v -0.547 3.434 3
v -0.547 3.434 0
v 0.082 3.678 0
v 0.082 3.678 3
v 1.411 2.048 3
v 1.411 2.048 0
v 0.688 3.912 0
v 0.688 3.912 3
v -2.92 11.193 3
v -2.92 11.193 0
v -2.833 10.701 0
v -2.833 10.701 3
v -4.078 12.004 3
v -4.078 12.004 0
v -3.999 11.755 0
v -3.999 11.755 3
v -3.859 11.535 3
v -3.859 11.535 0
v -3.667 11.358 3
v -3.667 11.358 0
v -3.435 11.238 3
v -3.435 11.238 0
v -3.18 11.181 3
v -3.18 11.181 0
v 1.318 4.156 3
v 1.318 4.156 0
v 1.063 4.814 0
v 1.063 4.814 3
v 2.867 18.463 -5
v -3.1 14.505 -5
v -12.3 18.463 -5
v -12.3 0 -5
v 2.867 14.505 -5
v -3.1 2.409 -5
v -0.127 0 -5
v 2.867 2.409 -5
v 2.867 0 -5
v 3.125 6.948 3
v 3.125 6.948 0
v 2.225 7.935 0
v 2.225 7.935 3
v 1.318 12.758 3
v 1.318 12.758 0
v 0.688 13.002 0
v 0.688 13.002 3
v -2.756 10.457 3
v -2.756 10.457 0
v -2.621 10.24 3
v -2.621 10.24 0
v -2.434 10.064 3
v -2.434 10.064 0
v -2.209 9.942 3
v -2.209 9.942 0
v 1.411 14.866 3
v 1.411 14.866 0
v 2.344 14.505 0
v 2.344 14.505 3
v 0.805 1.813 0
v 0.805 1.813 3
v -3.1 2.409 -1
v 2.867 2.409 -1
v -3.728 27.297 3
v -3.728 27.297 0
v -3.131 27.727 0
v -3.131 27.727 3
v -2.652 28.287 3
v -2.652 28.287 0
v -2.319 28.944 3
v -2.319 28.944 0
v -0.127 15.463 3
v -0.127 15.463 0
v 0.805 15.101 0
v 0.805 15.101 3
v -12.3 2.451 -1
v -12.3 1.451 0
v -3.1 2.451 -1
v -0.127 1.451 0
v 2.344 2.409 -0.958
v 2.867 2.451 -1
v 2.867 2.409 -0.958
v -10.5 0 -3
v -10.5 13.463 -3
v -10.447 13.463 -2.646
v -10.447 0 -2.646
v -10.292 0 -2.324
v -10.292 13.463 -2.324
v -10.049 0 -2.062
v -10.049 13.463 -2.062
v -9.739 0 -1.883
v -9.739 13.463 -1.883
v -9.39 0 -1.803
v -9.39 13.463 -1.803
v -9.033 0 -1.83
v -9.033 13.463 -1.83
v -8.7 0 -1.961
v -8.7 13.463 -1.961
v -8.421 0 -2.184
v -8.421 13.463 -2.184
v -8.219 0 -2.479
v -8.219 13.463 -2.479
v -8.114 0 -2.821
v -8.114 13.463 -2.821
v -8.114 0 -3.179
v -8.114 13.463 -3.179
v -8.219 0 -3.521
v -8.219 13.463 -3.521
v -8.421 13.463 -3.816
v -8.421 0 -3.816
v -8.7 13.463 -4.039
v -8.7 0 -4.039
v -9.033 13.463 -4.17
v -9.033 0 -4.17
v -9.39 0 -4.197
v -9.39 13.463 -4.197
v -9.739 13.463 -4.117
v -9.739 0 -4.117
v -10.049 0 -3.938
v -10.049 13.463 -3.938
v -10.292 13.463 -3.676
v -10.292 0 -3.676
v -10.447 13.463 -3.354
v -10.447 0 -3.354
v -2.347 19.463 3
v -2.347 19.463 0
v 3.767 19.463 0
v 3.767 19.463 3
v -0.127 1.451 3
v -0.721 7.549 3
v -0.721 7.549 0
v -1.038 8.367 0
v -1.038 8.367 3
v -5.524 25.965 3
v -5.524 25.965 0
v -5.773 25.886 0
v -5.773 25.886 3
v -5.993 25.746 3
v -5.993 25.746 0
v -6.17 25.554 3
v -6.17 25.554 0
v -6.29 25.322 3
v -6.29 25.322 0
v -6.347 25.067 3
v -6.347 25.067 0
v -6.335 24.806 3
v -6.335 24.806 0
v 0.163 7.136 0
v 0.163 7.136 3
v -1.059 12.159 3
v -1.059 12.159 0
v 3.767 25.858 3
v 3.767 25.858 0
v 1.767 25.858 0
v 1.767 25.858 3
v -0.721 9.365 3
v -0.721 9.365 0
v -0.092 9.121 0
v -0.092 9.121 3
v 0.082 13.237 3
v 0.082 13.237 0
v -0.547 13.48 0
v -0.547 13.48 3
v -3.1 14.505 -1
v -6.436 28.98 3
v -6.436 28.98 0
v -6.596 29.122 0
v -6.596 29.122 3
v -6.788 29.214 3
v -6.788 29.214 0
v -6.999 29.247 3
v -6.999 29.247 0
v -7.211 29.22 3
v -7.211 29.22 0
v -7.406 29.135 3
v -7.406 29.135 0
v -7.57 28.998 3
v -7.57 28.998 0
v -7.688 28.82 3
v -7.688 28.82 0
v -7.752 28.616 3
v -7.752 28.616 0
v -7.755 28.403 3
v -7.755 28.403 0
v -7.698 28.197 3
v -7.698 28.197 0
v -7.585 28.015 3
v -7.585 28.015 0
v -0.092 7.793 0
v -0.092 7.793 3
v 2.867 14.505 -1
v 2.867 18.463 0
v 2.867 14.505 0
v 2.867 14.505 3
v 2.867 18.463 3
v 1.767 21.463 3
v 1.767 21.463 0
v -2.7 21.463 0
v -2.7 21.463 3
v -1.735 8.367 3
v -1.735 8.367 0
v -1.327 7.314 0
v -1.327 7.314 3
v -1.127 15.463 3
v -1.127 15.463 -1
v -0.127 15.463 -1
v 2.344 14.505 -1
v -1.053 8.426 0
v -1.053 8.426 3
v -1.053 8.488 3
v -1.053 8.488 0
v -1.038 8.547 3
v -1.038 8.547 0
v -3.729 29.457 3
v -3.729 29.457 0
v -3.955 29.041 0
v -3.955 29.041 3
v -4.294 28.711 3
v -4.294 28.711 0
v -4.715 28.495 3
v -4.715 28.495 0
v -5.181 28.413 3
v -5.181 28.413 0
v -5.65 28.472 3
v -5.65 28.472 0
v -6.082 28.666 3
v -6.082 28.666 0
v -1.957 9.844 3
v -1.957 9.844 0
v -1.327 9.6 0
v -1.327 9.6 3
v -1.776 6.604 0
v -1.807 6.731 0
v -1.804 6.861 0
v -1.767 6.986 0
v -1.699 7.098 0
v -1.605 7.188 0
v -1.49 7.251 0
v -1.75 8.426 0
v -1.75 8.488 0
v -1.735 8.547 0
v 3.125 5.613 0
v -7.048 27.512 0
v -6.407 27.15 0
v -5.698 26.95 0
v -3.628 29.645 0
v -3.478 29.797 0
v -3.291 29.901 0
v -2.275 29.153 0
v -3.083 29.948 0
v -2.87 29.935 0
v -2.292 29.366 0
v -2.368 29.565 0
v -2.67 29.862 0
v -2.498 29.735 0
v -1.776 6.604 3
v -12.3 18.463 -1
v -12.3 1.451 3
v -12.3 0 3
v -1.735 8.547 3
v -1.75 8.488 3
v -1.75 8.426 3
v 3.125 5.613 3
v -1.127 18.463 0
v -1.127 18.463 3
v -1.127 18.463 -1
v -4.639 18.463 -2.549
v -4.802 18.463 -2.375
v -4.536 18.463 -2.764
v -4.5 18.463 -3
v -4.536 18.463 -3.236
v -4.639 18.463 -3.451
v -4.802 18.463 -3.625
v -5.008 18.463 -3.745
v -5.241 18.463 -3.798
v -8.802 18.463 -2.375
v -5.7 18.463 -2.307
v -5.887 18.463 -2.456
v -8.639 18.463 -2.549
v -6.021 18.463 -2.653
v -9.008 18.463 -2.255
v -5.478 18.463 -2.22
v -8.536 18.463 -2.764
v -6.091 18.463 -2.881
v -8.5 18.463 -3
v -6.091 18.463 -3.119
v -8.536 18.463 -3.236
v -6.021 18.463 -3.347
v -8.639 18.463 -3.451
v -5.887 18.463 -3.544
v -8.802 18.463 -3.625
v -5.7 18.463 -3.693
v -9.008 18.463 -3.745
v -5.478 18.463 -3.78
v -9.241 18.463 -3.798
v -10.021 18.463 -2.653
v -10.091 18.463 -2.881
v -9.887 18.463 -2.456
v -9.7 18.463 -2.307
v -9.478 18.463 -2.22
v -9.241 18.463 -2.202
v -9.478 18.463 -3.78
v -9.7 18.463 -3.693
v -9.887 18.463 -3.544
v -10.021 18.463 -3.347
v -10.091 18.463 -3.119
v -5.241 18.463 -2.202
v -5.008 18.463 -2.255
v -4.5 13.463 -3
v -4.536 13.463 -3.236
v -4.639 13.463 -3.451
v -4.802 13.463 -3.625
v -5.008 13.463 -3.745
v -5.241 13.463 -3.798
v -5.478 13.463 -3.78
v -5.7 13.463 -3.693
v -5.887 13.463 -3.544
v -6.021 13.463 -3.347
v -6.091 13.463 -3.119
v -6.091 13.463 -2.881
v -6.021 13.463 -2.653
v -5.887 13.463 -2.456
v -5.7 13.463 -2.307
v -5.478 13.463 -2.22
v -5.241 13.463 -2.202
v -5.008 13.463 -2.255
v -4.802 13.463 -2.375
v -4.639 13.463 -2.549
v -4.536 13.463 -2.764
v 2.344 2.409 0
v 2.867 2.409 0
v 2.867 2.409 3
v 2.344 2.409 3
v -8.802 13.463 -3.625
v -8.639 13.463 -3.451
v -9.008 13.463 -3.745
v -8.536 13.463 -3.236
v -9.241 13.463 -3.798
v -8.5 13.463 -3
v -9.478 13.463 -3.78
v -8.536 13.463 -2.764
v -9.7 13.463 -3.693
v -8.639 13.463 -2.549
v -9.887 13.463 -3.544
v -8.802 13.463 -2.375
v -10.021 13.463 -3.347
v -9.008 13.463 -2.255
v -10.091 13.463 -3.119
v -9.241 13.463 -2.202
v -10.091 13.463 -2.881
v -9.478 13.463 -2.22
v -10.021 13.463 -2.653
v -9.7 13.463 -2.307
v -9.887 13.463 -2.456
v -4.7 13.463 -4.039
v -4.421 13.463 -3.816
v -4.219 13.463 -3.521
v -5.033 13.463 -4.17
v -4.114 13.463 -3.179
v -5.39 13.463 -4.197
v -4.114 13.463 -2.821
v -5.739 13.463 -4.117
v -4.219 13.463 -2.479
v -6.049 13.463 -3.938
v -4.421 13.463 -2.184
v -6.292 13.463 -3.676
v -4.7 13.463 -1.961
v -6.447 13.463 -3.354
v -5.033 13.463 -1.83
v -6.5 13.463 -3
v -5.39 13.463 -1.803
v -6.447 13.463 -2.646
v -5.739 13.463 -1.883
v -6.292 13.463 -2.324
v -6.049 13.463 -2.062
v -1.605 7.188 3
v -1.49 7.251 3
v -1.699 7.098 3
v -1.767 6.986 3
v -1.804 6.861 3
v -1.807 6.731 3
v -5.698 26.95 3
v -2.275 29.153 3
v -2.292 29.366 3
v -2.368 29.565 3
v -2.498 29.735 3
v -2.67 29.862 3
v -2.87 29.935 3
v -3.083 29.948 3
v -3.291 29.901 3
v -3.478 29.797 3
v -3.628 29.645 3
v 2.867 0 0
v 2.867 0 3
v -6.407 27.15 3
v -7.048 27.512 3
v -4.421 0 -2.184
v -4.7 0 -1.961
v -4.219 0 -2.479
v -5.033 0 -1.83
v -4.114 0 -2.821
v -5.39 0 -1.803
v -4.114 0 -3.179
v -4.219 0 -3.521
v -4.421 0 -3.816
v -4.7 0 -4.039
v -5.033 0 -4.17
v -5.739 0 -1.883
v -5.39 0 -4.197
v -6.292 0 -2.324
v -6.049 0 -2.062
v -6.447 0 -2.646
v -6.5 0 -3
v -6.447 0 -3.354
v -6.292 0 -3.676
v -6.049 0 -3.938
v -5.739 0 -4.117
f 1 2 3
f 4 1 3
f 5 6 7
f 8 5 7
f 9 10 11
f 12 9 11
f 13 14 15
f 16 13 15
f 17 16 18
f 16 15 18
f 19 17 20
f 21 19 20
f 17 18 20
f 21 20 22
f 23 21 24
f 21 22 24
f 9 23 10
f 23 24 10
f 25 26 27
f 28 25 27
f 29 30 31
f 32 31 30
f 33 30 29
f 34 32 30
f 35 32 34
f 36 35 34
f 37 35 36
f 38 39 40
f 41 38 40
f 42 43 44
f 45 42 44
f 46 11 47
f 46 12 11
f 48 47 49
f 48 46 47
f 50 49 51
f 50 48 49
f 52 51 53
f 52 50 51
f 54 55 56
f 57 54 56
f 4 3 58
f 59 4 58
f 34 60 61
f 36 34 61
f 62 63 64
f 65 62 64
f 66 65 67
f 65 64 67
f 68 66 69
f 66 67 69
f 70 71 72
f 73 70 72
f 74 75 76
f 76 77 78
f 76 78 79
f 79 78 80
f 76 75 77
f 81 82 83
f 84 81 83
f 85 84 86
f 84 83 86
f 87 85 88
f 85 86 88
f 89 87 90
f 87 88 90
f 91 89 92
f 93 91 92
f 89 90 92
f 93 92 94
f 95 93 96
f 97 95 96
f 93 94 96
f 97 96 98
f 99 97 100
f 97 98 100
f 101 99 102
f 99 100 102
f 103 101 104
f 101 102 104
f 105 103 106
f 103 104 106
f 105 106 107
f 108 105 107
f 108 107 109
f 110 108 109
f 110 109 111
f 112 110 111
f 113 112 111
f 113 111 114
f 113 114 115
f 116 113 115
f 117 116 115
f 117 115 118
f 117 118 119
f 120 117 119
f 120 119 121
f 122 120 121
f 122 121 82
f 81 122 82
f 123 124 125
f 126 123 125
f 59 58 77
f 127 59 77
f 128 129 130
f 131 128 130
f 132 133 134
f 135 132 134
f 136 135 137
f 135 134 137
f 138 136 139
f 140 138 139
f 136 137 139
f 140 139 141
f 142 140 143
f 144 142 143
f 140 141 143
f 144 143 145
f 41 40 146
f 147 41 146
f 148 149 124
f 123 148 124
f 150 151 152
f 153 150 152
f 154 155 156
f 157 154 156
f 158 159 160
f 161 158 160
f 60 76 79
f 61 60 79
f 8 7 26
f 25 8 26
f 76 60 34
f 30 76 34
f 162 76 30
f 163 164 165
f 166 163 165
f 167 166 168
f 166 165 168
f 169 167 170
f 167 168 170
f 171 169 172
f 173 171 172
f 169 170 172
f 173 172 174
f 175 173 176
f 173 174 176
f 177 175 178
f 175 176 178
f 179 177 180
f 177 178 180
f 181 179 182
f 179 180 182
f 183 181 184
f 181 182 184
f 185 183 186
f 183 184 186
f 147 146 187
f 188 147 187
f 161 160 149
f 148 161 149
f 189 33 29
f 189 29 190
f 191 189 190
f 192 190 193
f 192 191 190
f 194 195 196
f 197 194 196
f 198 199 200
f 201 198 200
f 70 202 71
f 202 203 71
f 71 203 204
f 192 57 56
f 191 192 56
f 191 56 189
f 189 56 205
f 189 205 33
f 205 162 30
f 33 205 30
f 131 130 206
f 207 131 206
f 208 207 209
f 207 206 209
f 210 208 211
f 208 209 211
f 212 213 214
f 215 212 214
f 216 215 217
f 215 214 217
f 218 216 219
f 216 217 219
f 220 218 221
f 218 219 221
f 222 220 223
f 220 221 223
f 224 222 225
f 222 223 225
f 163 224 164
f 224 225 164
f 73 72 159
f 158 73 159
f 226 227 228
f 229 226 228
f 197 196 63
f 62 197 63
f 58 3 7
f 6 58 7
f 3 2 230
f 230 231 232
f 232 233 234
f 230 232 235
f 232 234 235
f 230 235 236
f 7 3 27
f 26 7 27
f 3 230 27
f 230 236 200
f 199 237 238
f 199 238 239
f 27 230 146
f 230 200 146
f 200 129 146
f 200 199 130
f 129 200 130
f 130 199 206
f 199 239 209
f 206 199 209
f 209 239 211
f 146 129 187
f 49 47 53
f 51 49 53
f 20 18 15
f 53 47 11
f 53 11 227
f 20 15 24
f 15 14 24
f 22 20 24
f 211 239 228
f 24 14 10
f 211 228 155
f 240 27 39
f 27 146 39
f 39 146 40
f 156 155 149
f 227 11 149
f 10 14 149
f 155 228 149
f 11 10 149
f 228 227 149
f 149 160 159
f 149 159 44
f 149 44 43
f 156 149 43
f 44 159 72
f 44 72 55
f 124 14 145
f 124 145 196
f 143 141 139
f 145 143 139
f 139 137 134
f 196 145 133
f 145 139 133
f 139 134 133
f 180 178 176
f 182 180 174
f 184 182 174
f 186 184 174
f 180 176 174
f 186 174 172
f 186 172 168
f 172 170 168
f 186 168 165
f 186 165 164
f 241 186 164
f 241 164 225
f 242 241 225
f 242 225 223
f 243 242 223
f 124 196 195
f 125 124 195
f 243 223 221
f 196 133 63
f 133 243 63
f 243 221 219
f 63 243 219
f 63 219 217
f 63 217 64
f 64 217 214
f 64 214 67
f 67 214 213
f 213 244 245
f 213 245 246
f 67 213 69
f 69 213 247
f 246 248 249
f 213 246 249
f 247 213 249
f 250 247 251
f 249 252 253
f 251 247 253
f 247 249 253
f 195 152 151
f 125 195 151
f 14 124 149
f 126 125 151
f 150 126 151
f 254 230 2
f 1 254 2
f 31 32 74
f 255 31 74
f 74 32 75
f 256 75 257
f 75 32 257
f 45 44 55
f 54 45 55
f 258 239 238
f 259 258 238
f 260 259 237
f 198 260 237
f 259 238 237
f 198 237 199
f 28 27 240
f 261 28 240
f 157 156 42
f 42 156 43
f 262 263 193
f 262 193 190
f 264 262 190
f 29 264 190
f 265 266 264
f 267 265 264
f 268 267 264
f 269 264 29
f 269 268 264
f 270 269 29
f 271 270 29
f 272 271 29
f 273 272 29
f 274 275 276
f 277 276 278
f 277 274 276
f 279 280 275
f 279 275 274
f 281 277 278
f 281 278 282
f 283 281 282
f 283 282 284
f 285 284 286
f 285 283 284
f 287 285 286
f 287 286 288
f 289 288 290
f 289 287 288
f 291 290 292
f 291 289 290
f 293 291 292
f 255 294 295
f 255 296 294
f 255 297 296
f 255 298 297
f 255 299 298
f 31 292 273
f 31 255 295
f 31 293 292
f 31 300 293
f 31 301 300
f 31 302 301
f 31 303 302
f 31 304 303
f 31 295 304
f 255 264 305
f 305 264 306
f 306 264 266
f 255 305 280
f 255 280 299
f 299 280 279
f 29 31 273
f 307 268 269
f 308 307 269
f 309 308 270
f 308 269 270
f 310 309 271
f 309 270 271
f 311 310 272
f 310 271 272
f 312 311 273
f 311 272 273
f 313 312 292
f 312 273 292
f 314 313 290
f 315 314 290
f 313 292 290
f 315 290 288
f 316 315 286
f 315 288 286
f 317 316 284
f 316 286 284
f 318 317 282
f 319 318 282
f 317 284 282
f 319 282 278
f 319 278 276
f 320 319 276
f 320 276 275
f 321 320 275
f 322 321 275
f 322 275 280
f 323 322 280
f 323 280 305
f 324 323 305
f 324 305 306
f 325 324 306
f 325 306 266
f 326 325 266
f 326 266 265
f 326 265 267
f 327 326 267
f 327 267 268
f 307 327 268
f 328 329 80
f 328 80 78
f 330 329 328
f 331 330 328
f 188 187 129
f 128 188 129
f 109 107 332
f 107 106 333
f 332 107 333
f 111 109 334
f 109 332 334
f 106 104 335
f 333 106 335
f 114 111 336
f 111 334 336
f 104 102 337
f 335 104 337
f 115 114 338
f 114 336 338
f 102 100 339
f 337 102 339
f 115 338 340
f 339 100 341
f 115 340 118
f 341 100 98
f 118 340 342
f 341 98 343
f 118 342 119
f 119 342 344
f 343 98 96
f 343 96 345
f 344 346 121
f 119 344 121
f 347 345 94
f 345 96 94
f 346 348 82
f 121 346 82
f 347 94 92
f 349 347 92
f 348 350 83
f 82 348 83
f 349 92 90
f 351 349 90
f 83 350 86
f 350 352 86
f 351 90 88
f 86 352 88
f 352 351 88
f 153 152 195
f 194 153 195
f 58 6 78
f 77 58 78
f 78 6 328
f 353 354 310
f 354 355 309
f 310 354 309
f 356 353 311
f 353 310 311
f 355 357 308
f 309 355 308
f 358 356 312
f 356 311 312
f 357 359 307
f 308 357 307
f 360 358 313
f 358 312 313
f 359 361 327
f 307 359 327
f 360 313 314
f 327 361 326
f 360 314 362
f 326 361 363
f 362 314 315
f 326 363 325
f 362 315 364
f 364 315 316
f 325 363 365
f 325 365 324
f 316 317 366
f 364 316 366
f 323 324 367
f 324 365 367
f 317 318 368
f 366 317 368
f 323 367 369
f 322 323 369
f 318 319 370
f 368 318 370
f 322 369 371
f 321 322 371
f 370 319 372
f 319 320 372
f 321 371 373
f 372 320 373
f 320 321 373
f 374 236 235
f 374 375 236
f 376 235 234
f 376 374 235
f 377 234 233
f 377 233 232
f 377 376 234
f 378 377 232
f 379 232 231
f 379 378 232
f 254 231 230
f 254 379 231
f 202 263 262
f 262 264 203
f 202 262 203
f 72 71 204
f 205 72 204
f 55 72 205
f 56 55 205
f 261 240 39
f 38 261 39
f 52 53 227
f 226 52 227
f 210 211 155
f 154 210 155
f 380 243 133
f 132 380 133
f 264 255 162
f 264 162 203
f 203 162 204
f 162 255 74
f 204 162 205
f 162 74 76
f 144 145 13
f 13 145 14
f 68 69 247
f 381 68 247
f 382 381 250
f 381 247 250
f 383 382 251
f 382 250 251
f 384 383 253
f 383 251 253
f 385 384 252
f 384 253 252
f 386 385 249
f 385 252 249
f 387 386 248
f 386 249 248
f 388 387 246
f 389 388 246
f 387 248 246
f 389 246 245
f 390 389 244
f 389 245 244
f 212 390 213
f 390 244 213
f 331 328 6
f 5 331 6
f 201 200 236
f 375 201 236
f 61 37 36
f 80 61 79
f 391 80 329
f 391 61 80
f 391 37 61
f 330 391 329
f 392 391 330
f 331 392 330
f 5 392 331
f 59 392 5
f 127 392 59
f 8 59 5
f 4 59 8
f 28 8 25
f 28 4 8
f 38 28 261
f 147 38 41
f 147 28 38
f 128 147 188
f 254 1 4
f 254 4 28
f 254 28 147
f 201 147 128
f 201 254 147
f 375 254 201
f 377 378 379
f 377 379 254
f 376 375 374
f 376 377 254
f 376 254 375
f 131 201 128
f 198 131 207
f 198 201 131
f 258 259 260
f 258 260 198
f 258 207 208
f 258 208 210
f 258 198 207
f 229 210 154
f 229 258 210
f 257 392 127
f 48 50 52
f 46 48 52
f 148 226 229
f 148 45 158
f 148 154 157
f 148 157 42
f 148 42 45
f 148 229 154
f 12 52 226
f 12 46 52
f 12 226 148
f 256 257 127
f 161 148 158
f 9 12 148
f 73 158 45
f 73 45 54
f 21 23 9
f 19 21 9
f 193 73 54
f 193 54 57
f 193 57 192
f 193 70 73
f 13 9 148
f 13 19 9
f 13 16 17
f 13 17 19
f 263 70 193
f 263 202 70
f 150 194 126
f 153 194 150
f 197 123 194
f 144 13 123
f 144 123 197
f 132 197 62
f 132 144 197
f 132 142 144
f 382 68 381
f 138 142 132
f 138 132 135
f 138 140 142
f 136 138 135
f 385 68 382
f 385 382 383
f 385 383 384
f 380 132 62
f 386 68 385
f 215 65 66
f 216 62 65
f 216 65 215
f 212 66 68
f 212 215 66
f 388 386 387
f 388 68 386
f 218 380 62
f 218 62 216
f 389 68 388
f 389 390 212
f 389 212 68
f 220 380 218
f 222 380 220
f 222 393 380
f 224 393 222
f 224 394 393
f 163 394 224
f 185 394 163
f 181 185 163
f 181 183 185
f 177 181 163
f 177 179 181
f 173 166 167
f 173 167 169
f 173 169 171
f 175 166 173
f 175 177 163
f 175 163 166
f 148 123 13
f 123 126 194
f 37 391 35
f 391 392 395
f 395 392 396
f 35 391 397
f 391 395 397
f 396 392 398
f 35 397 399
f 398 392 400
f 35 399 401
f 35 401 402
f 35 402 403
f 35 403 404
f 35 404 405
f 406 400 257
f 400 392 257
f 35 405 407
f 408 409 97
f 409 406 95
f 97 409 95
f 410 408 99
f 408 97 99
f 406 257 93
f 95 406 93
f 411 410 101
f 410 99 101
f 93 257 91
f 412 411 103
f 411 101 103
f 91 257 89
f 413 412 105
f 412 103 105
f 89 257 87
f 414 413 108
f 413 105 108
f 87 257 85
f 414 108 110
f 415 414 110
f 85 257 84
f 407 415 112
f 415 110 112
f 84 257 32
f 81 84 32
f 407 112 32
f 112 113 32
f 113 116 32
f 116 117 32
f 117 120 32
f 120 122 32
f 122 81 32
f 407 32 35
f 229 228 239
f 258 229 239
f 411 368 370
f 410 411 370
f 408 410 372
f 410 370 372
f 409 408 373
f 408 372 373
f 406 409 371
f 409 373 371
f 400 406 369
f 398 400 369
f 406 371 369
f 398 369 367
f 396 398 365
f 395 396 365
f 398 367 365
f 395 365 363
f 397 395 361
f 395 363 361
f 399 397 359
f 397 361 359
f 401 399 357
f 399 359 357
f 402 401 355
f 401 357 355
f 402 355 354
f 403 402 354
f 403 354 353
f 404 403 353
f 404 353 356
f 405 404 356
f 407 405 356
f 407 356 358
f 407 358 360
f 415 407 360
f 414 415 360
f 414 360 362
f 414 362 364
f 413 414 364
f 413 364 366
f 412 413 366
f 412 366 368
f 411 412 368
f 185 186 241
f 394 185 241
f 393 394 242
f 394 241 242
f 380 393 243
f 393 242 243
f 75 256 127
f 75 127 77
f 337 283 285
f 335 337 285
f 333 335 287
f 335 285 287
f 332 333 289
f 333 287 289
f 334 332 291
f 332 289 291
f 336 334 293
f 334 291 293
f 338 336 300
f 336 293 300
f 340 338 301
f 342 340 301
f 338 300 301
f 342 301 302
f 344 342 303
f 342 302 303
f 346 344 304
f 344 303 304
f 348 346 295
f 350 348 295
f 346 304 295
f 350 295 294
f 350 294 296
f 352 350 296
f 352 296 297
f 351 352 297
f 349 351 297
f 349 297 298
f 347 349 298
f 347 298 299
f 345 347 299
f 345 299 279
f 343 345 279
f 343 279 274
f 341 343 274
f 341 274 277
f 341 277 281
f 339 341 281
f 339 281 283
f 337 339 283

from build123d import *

# Parameters (mm, degrees)
BOSS_SWITCH_BODY_DEPTH            = 3
SKETCH1_W                         = 2.994375291
SKETCH1_H                         = 2.409101515
SKETCH1_W_2                       = 3.994375291
SKETCH1_H_2                       = 3.957767538
BOSS_FLANGE_WIDTH_DEPTH           = 5
BOSS_FLANGE_HEIGHT_REACH          = 36.354
SKETCH2_W                         = 4
SKETCH2_H                         = 3.957767538
SKETCH2_W_2                       = 8
SKETCH2_H_2                       = 1.451333978
SKETCH17_W                        = 15.1675
SKETCH17_H                        = 4
BOSS_FLANGE_SUPPORT_DEPTH         = 13.053634428
CUT_WALL_GAP_DEPTH                = 1
TAP_DRILL_FOR_M2X0_4_TAP1_D       = 1.6
M2_CLEARANCE_HOLE2_D              = 2.4
M2_CLEARANCE_HOLE2_DEPTH          = 13.462735941
CHAMFER_FLANGE_SUPPORT_3_SIZE     = 1
FILLET1_R                         = 1
FILLET2_R                         = 0.5
SKETCH28_W                        = 5.9675
SKETCH28_H                        = 12.095866891
CUT_PRINT_SUPPORT_CLEARANCE_DEPTH = 33.624103931


with BuildPart() as part:
    # Sketch-SwitchBossUp → Boss-Switch Body (new body)
    with BuildSketch(Plane.XY):
        with BuildLine():
            Line((-5.697895702, 26.949658376), (-5.524247524, 25.964850623))
            ThreePointArc((-5.524247524, 25.964850623), (-6.169751391, 25.553619307), (-6.3354071, 24.806394693))
            Line((-6.3354071, 24.806394693), (-4.07798079, 12.003893904))
            ThreePointArc((-4.07798079, 12.003893904), (-3.666749473, 11.358390037), (-2.919524859, 11.192734328))
            Line((-2.919524859, 11.192734328), (-2.734924291, 10.145812481))
            Line((-2.734924291, 10.145812481), (-1.956559213, 9.844099378))
            Line((-1.956559213, 9.844099378), (-1.327187553, 9.600139722))
            Line((-1.327187553, 9.600139722), (-1.735258621, 8.547390389))
            ThreePointArc((-1.735258621, 8.547390389), (-1.752158006, 8.457034961), (-1.735258621, 8.366679532))
            Line((-1.735258621, 8.366679532), (-1.327187553, 7.313930199))
            Line((-1.327187553, 7.313930199), (-1.956559213, 7.069970543))
            Line((-1.956559213, 7.069970543), (-0.547014535, 3.433600952))
            Line((-0.547014535, 3.433600952), (0.082357125, 3.677560608))
            Line((0.082357125, 3.677560608), (0.805200549, 1.81275569))
            Line((0.805200549, 1.81275569), (-0.12720191, 1.451333978))
            Line((-0.12720191, 1.451333978), (-0.12720191, 0))
            Line((-0.12720191, 0), (2.867173381, 0))
            Line((2.867173381, 0), (2.867173381, 2.409101515))
            Line((2.867173381, 2.409101515), (2.343664607, 2.409101515))
            Line((2.343664607, 2.409101515), (1.411262148, 2.047679803))
            Line((1.411262148, 2.047679803), (0.688418723, 3.912484721))
            Line((0.688418723, 3.912484721), (1.317790383, 4.156444377))
            Line((1.317790383, 4.156444377), (1.063052687, 4.813621425))
            Line((1.063052687, 4.813621425), (3.125189653, 5.612955517))
            Line((3.125189653, 5.612955517), (3.125189653, 6.948407561))
            Line((3.125189653, 6.948407561), (2.225005405, 7.93492645))
            Line((2.225005405, 7.93492645), (0.162983401, 7.13563692))
            Line((0.162983401, 7.13563692), (-0.091754295, 7.792813968))
            Line((-0.091754295, 7.792813968), (-0.721125955, 7.548854312))
            Line((-0.721125955, 7.548854312), (-1.038134762, 8.366679532))
            ThreePointArc((-1.038134762, 8.366679532), (-1.055034148, 8.457034961), (-1.038134762, 8.547390389))
            Line((-1.038134762, 8.547390389), (-0.721125955, 9.365215609))
            Line((-0.721125955, 9.365215609), (-0.091754295, 9.121255953))
            Line((-0.091754295, 9.121255953), (1.317790383, 12.757625544))
            Line((1.317790383, 12.757625544), (0.688418723, 13.0015852))
            Line((0.688418723, 13.0015852), (1.411262148, 14.866390118))
            Line((1.411262148, 14.866390118), (2.343664607, 14.504968406))
            Line((2.343664607, 14.504968406), (2.867173381, 14.504968406))
            Line((2.867173381, 14.504968406), (2.867173381, 18.462735944))
            Line((2.867173381, 18.462735944), (-0.111637615, 18.462735944))
            Line((-0.111637615, 18.462735944), (-1.12720191, 18.462735944))
            Line((-1.12720191, 18.462735944), (-1.12720191, 15.462735944))
            Line((-1.12720191, 15.462735944), (-0.12720191, 15.462735944))
            Line((-0.12720191, 15.462735944), (0.805200549, 15.101314231))
            Line((0.805200549, 15.101314231), (0.082357125, 13.236509313))
            Line((0.082357125, 13.236509313), (-0.547014535, 13.480468969))
            Line((-0.547014535, 13.480468969), (-1.059112089, 12.159350171))
            Line((-1.059112089, 12.159350171), (-2.346896051, 19.462735944))
            Line((-2.346896051, 19.462735944), (3.767173381, 19.462735944))
            Line((3.767173381, 19.462735944), (3.767173381, 25.857619356))
            Line((3.767173381, 25.857619356), (1.767173381, 25.857619356))
            Line((1.767173381, 25.857619356), (1.767173381, 21.462735944))
            Line((1.767173381, 21.462735944), (-2.699550012, 21.462735944))
            Line((-2.699550012, 21.462735944), (-3.728280196, 27.296954732))
            ThreePointArc((-3.728280196, 27.296954732), (-2.874356585, 27.992742953), (-2.319025652, 28.944012807))
            ThreePointArc((-2.319025652, 28.944012807), (-2.76728001, 29.905297381), (-3.728564583, 29.457043022))
            ThreePointArc((-3.728564583, 29.457043022), (-4.944660137, 28.436617692), (-6.436422172, 28.97957467))
            ThreePointArc((-6.436422172, 28.97957467), (-7.493046212, 29.072017295), (-7.585488837, 28.015393255))
            ThreePointArc((-7.585488837, 28.015393255), (-6.738295005, 27.311426358), (-5.697895702, 26.949658376))
        make_face()
    extrude(amount=BOSS_SWITCH_BODY_DEPTH)

    # Sketch1 → Boss-Flange Width (add)
    with BuildSketch(Plane(origin=(0, 0, 0), x_dir=(-1, 0, 0), z_dir=(0, 0, -1))):
        with Locations((-1.369985736, 1.204550758)):
            Rectangle(SKETCH1_W, SKETCH1_H)
        with Locations((-0.869985736, 16.483852175)):
            Rectangle(SKETCH1_W_2, SKETCH1_H_2)
    extrude(amount=BOSS_FLANGE_WIDTH_DEPTH)

    # Boss-Flange Height: up to this face of the body (flat: up to its plane)
    boss_flange_height_end = Plane(part.part.faces().sort_by_distance((-0.12720191, 1.077409098, -1.438016547))[0])
    # Sketch2 → Boss-Flange Height (add, up to the picked face)
    with BuildSketch(Plane(origin=(-12.300326619, 0, 0), x_dir=(0, 0, -1), z_dir=(1, 0, 0)), mode=Mode.PRIVATE) as boss_flange_height_sk1:
        with Locations((3, 16.483852175)):
            Rectangle(SKETCH2_W, SKETCH2_H)
    boss_flange_height_tool1 = split(extrude(boss_flange_height_sk1.sketch, amount=BOSS_FLANGE_HEIGHT_REACH, mode=Mode.PRIVATE), bisect_by=boss_flange_height_end, keep=Keep.BOTH, mode=Mode.PRIVATE)
    # Sketch2 → Boss-Flange Height (add, up to the picked face)
    with BuildSketch(Plane(origin=(-12.300326619, 0, 0), x_dir=(0, 0, -1), z_dir=(1, 0, 0)), mode=Mode.PRIVATE) as boss_flange_height_sk2:
        with Locations((1, 0.725666989)):
            Rectangle(SKETCH2_W_2, SKETCH2_H_2)
    boss_flange_height_tool2 = split(extrude(boss_flange_height_sk2.sketch, amount=BOSS_FLANGE_HEIGHT_REACH, mode=Mode.PRIVATE), bisect_by=boss_flange_height_end, keep=Keep.BOTH, mode=Mode.PRIVATE)
    add(boss_flange_height_tool1.solids().sort_by(Axis((-12.300327, 16.483852, -3), (1, 0, 0)))[0])
    add(boss_flange_height_tool2.solids().sort_by(Axis((-12.300327, 0.725667, -1), (1, 0, 0)))[0])

    # Sketch17 → Boss-Flange Support (add)
    with BuildSketch(Plane.XZ.offset(-1.451333978)):
        with Locations((-4.716576619, -3)):
            Rectangle(SKETCH17_W, SKETCH17_H)
    extrude(amount=-BOSS_FLANGE_SUPPORT_DEPTH)

    # Sketch27 → Cut-Wall Gap (cut)
    with BuildSketch(Plane.XY):
        Polygon((-0.12720191, 15.462735944), (2.343664607, 14.504968406), (-1.12720191, 14.504968406), (-1.12720191, 15.462735944), align=None)
        Polygon((2.343664607, 2.409101515), (-0.12720191, 2.409101515), (-0.12720191, 1.451333978), align=None)
    extrude(amount=-CUT_WALL_GAP_DEPTH, mode=Mode.SUBTRACT)

    # Tap Drill for M2x0.4 Tap1 (through all)
    with Locations(Plane(origin=(0, 0, 0), x_dir=(-1, 0, 0), z_dir=(0, -1, 0))):
        with Locations((9.300326619, 3), (5.300326619, 3)):
            Hole(TAP_DRILL_FOR_M2X0_4_TAP1_D / 2)

    # M2 Clearance Hole2
    with Locations(Plane.XZ):
        with Locations((-9.300326619, -3), (-5.300326619, -3)):
            Hole(M2_CLEARANCE_HOLE2_D / 2, depth=M2_CLEARANCE_HOLE2_DEPTH)

    # Chamfer-Flange Support 3
    chamfer_flange_support_3_edges = [part.edges().sort_by_distance(p)[0] for p in [
        (-6.213764264, 1.451333978, -1),
    ]]
    chamfer(chamfer_flange_support_3_edges, length=CHAMFER_FLANGE_SUPPORT_3_SIZE)

    # Fillet1
    fillet1_edges = [part.edges().sort_by_distance(p)[0] for p in [
        (-2.734924291, 10.145812481, 1.5),
    ]]
    fillet(fillet1_edges, radius=FILLET1_R)

    # Fillet2
    fillet2_edges = [part.edges().sort_by_distance(p)[0] for p in [
        (-1.956559213, 7.069970543, 1.5),
    ]]
    fillet(fillet2_edges, radius=FILLET2_R)

    # Sketch28 → Cut-Print Support Clearance (cut, through all)
    with BuildSketch(Plane.XY.offset(-1)):
        with Locations((-0.116576619, 8.457034961)):
            Rectangle(SKETCH28_W, SKETCH28_H)
    extrude(amount=-CUT_PRINT_SUPPORT_CLEARANCE_DEPTH, mode=Mode.SUBTRACT)


solid = part.part
